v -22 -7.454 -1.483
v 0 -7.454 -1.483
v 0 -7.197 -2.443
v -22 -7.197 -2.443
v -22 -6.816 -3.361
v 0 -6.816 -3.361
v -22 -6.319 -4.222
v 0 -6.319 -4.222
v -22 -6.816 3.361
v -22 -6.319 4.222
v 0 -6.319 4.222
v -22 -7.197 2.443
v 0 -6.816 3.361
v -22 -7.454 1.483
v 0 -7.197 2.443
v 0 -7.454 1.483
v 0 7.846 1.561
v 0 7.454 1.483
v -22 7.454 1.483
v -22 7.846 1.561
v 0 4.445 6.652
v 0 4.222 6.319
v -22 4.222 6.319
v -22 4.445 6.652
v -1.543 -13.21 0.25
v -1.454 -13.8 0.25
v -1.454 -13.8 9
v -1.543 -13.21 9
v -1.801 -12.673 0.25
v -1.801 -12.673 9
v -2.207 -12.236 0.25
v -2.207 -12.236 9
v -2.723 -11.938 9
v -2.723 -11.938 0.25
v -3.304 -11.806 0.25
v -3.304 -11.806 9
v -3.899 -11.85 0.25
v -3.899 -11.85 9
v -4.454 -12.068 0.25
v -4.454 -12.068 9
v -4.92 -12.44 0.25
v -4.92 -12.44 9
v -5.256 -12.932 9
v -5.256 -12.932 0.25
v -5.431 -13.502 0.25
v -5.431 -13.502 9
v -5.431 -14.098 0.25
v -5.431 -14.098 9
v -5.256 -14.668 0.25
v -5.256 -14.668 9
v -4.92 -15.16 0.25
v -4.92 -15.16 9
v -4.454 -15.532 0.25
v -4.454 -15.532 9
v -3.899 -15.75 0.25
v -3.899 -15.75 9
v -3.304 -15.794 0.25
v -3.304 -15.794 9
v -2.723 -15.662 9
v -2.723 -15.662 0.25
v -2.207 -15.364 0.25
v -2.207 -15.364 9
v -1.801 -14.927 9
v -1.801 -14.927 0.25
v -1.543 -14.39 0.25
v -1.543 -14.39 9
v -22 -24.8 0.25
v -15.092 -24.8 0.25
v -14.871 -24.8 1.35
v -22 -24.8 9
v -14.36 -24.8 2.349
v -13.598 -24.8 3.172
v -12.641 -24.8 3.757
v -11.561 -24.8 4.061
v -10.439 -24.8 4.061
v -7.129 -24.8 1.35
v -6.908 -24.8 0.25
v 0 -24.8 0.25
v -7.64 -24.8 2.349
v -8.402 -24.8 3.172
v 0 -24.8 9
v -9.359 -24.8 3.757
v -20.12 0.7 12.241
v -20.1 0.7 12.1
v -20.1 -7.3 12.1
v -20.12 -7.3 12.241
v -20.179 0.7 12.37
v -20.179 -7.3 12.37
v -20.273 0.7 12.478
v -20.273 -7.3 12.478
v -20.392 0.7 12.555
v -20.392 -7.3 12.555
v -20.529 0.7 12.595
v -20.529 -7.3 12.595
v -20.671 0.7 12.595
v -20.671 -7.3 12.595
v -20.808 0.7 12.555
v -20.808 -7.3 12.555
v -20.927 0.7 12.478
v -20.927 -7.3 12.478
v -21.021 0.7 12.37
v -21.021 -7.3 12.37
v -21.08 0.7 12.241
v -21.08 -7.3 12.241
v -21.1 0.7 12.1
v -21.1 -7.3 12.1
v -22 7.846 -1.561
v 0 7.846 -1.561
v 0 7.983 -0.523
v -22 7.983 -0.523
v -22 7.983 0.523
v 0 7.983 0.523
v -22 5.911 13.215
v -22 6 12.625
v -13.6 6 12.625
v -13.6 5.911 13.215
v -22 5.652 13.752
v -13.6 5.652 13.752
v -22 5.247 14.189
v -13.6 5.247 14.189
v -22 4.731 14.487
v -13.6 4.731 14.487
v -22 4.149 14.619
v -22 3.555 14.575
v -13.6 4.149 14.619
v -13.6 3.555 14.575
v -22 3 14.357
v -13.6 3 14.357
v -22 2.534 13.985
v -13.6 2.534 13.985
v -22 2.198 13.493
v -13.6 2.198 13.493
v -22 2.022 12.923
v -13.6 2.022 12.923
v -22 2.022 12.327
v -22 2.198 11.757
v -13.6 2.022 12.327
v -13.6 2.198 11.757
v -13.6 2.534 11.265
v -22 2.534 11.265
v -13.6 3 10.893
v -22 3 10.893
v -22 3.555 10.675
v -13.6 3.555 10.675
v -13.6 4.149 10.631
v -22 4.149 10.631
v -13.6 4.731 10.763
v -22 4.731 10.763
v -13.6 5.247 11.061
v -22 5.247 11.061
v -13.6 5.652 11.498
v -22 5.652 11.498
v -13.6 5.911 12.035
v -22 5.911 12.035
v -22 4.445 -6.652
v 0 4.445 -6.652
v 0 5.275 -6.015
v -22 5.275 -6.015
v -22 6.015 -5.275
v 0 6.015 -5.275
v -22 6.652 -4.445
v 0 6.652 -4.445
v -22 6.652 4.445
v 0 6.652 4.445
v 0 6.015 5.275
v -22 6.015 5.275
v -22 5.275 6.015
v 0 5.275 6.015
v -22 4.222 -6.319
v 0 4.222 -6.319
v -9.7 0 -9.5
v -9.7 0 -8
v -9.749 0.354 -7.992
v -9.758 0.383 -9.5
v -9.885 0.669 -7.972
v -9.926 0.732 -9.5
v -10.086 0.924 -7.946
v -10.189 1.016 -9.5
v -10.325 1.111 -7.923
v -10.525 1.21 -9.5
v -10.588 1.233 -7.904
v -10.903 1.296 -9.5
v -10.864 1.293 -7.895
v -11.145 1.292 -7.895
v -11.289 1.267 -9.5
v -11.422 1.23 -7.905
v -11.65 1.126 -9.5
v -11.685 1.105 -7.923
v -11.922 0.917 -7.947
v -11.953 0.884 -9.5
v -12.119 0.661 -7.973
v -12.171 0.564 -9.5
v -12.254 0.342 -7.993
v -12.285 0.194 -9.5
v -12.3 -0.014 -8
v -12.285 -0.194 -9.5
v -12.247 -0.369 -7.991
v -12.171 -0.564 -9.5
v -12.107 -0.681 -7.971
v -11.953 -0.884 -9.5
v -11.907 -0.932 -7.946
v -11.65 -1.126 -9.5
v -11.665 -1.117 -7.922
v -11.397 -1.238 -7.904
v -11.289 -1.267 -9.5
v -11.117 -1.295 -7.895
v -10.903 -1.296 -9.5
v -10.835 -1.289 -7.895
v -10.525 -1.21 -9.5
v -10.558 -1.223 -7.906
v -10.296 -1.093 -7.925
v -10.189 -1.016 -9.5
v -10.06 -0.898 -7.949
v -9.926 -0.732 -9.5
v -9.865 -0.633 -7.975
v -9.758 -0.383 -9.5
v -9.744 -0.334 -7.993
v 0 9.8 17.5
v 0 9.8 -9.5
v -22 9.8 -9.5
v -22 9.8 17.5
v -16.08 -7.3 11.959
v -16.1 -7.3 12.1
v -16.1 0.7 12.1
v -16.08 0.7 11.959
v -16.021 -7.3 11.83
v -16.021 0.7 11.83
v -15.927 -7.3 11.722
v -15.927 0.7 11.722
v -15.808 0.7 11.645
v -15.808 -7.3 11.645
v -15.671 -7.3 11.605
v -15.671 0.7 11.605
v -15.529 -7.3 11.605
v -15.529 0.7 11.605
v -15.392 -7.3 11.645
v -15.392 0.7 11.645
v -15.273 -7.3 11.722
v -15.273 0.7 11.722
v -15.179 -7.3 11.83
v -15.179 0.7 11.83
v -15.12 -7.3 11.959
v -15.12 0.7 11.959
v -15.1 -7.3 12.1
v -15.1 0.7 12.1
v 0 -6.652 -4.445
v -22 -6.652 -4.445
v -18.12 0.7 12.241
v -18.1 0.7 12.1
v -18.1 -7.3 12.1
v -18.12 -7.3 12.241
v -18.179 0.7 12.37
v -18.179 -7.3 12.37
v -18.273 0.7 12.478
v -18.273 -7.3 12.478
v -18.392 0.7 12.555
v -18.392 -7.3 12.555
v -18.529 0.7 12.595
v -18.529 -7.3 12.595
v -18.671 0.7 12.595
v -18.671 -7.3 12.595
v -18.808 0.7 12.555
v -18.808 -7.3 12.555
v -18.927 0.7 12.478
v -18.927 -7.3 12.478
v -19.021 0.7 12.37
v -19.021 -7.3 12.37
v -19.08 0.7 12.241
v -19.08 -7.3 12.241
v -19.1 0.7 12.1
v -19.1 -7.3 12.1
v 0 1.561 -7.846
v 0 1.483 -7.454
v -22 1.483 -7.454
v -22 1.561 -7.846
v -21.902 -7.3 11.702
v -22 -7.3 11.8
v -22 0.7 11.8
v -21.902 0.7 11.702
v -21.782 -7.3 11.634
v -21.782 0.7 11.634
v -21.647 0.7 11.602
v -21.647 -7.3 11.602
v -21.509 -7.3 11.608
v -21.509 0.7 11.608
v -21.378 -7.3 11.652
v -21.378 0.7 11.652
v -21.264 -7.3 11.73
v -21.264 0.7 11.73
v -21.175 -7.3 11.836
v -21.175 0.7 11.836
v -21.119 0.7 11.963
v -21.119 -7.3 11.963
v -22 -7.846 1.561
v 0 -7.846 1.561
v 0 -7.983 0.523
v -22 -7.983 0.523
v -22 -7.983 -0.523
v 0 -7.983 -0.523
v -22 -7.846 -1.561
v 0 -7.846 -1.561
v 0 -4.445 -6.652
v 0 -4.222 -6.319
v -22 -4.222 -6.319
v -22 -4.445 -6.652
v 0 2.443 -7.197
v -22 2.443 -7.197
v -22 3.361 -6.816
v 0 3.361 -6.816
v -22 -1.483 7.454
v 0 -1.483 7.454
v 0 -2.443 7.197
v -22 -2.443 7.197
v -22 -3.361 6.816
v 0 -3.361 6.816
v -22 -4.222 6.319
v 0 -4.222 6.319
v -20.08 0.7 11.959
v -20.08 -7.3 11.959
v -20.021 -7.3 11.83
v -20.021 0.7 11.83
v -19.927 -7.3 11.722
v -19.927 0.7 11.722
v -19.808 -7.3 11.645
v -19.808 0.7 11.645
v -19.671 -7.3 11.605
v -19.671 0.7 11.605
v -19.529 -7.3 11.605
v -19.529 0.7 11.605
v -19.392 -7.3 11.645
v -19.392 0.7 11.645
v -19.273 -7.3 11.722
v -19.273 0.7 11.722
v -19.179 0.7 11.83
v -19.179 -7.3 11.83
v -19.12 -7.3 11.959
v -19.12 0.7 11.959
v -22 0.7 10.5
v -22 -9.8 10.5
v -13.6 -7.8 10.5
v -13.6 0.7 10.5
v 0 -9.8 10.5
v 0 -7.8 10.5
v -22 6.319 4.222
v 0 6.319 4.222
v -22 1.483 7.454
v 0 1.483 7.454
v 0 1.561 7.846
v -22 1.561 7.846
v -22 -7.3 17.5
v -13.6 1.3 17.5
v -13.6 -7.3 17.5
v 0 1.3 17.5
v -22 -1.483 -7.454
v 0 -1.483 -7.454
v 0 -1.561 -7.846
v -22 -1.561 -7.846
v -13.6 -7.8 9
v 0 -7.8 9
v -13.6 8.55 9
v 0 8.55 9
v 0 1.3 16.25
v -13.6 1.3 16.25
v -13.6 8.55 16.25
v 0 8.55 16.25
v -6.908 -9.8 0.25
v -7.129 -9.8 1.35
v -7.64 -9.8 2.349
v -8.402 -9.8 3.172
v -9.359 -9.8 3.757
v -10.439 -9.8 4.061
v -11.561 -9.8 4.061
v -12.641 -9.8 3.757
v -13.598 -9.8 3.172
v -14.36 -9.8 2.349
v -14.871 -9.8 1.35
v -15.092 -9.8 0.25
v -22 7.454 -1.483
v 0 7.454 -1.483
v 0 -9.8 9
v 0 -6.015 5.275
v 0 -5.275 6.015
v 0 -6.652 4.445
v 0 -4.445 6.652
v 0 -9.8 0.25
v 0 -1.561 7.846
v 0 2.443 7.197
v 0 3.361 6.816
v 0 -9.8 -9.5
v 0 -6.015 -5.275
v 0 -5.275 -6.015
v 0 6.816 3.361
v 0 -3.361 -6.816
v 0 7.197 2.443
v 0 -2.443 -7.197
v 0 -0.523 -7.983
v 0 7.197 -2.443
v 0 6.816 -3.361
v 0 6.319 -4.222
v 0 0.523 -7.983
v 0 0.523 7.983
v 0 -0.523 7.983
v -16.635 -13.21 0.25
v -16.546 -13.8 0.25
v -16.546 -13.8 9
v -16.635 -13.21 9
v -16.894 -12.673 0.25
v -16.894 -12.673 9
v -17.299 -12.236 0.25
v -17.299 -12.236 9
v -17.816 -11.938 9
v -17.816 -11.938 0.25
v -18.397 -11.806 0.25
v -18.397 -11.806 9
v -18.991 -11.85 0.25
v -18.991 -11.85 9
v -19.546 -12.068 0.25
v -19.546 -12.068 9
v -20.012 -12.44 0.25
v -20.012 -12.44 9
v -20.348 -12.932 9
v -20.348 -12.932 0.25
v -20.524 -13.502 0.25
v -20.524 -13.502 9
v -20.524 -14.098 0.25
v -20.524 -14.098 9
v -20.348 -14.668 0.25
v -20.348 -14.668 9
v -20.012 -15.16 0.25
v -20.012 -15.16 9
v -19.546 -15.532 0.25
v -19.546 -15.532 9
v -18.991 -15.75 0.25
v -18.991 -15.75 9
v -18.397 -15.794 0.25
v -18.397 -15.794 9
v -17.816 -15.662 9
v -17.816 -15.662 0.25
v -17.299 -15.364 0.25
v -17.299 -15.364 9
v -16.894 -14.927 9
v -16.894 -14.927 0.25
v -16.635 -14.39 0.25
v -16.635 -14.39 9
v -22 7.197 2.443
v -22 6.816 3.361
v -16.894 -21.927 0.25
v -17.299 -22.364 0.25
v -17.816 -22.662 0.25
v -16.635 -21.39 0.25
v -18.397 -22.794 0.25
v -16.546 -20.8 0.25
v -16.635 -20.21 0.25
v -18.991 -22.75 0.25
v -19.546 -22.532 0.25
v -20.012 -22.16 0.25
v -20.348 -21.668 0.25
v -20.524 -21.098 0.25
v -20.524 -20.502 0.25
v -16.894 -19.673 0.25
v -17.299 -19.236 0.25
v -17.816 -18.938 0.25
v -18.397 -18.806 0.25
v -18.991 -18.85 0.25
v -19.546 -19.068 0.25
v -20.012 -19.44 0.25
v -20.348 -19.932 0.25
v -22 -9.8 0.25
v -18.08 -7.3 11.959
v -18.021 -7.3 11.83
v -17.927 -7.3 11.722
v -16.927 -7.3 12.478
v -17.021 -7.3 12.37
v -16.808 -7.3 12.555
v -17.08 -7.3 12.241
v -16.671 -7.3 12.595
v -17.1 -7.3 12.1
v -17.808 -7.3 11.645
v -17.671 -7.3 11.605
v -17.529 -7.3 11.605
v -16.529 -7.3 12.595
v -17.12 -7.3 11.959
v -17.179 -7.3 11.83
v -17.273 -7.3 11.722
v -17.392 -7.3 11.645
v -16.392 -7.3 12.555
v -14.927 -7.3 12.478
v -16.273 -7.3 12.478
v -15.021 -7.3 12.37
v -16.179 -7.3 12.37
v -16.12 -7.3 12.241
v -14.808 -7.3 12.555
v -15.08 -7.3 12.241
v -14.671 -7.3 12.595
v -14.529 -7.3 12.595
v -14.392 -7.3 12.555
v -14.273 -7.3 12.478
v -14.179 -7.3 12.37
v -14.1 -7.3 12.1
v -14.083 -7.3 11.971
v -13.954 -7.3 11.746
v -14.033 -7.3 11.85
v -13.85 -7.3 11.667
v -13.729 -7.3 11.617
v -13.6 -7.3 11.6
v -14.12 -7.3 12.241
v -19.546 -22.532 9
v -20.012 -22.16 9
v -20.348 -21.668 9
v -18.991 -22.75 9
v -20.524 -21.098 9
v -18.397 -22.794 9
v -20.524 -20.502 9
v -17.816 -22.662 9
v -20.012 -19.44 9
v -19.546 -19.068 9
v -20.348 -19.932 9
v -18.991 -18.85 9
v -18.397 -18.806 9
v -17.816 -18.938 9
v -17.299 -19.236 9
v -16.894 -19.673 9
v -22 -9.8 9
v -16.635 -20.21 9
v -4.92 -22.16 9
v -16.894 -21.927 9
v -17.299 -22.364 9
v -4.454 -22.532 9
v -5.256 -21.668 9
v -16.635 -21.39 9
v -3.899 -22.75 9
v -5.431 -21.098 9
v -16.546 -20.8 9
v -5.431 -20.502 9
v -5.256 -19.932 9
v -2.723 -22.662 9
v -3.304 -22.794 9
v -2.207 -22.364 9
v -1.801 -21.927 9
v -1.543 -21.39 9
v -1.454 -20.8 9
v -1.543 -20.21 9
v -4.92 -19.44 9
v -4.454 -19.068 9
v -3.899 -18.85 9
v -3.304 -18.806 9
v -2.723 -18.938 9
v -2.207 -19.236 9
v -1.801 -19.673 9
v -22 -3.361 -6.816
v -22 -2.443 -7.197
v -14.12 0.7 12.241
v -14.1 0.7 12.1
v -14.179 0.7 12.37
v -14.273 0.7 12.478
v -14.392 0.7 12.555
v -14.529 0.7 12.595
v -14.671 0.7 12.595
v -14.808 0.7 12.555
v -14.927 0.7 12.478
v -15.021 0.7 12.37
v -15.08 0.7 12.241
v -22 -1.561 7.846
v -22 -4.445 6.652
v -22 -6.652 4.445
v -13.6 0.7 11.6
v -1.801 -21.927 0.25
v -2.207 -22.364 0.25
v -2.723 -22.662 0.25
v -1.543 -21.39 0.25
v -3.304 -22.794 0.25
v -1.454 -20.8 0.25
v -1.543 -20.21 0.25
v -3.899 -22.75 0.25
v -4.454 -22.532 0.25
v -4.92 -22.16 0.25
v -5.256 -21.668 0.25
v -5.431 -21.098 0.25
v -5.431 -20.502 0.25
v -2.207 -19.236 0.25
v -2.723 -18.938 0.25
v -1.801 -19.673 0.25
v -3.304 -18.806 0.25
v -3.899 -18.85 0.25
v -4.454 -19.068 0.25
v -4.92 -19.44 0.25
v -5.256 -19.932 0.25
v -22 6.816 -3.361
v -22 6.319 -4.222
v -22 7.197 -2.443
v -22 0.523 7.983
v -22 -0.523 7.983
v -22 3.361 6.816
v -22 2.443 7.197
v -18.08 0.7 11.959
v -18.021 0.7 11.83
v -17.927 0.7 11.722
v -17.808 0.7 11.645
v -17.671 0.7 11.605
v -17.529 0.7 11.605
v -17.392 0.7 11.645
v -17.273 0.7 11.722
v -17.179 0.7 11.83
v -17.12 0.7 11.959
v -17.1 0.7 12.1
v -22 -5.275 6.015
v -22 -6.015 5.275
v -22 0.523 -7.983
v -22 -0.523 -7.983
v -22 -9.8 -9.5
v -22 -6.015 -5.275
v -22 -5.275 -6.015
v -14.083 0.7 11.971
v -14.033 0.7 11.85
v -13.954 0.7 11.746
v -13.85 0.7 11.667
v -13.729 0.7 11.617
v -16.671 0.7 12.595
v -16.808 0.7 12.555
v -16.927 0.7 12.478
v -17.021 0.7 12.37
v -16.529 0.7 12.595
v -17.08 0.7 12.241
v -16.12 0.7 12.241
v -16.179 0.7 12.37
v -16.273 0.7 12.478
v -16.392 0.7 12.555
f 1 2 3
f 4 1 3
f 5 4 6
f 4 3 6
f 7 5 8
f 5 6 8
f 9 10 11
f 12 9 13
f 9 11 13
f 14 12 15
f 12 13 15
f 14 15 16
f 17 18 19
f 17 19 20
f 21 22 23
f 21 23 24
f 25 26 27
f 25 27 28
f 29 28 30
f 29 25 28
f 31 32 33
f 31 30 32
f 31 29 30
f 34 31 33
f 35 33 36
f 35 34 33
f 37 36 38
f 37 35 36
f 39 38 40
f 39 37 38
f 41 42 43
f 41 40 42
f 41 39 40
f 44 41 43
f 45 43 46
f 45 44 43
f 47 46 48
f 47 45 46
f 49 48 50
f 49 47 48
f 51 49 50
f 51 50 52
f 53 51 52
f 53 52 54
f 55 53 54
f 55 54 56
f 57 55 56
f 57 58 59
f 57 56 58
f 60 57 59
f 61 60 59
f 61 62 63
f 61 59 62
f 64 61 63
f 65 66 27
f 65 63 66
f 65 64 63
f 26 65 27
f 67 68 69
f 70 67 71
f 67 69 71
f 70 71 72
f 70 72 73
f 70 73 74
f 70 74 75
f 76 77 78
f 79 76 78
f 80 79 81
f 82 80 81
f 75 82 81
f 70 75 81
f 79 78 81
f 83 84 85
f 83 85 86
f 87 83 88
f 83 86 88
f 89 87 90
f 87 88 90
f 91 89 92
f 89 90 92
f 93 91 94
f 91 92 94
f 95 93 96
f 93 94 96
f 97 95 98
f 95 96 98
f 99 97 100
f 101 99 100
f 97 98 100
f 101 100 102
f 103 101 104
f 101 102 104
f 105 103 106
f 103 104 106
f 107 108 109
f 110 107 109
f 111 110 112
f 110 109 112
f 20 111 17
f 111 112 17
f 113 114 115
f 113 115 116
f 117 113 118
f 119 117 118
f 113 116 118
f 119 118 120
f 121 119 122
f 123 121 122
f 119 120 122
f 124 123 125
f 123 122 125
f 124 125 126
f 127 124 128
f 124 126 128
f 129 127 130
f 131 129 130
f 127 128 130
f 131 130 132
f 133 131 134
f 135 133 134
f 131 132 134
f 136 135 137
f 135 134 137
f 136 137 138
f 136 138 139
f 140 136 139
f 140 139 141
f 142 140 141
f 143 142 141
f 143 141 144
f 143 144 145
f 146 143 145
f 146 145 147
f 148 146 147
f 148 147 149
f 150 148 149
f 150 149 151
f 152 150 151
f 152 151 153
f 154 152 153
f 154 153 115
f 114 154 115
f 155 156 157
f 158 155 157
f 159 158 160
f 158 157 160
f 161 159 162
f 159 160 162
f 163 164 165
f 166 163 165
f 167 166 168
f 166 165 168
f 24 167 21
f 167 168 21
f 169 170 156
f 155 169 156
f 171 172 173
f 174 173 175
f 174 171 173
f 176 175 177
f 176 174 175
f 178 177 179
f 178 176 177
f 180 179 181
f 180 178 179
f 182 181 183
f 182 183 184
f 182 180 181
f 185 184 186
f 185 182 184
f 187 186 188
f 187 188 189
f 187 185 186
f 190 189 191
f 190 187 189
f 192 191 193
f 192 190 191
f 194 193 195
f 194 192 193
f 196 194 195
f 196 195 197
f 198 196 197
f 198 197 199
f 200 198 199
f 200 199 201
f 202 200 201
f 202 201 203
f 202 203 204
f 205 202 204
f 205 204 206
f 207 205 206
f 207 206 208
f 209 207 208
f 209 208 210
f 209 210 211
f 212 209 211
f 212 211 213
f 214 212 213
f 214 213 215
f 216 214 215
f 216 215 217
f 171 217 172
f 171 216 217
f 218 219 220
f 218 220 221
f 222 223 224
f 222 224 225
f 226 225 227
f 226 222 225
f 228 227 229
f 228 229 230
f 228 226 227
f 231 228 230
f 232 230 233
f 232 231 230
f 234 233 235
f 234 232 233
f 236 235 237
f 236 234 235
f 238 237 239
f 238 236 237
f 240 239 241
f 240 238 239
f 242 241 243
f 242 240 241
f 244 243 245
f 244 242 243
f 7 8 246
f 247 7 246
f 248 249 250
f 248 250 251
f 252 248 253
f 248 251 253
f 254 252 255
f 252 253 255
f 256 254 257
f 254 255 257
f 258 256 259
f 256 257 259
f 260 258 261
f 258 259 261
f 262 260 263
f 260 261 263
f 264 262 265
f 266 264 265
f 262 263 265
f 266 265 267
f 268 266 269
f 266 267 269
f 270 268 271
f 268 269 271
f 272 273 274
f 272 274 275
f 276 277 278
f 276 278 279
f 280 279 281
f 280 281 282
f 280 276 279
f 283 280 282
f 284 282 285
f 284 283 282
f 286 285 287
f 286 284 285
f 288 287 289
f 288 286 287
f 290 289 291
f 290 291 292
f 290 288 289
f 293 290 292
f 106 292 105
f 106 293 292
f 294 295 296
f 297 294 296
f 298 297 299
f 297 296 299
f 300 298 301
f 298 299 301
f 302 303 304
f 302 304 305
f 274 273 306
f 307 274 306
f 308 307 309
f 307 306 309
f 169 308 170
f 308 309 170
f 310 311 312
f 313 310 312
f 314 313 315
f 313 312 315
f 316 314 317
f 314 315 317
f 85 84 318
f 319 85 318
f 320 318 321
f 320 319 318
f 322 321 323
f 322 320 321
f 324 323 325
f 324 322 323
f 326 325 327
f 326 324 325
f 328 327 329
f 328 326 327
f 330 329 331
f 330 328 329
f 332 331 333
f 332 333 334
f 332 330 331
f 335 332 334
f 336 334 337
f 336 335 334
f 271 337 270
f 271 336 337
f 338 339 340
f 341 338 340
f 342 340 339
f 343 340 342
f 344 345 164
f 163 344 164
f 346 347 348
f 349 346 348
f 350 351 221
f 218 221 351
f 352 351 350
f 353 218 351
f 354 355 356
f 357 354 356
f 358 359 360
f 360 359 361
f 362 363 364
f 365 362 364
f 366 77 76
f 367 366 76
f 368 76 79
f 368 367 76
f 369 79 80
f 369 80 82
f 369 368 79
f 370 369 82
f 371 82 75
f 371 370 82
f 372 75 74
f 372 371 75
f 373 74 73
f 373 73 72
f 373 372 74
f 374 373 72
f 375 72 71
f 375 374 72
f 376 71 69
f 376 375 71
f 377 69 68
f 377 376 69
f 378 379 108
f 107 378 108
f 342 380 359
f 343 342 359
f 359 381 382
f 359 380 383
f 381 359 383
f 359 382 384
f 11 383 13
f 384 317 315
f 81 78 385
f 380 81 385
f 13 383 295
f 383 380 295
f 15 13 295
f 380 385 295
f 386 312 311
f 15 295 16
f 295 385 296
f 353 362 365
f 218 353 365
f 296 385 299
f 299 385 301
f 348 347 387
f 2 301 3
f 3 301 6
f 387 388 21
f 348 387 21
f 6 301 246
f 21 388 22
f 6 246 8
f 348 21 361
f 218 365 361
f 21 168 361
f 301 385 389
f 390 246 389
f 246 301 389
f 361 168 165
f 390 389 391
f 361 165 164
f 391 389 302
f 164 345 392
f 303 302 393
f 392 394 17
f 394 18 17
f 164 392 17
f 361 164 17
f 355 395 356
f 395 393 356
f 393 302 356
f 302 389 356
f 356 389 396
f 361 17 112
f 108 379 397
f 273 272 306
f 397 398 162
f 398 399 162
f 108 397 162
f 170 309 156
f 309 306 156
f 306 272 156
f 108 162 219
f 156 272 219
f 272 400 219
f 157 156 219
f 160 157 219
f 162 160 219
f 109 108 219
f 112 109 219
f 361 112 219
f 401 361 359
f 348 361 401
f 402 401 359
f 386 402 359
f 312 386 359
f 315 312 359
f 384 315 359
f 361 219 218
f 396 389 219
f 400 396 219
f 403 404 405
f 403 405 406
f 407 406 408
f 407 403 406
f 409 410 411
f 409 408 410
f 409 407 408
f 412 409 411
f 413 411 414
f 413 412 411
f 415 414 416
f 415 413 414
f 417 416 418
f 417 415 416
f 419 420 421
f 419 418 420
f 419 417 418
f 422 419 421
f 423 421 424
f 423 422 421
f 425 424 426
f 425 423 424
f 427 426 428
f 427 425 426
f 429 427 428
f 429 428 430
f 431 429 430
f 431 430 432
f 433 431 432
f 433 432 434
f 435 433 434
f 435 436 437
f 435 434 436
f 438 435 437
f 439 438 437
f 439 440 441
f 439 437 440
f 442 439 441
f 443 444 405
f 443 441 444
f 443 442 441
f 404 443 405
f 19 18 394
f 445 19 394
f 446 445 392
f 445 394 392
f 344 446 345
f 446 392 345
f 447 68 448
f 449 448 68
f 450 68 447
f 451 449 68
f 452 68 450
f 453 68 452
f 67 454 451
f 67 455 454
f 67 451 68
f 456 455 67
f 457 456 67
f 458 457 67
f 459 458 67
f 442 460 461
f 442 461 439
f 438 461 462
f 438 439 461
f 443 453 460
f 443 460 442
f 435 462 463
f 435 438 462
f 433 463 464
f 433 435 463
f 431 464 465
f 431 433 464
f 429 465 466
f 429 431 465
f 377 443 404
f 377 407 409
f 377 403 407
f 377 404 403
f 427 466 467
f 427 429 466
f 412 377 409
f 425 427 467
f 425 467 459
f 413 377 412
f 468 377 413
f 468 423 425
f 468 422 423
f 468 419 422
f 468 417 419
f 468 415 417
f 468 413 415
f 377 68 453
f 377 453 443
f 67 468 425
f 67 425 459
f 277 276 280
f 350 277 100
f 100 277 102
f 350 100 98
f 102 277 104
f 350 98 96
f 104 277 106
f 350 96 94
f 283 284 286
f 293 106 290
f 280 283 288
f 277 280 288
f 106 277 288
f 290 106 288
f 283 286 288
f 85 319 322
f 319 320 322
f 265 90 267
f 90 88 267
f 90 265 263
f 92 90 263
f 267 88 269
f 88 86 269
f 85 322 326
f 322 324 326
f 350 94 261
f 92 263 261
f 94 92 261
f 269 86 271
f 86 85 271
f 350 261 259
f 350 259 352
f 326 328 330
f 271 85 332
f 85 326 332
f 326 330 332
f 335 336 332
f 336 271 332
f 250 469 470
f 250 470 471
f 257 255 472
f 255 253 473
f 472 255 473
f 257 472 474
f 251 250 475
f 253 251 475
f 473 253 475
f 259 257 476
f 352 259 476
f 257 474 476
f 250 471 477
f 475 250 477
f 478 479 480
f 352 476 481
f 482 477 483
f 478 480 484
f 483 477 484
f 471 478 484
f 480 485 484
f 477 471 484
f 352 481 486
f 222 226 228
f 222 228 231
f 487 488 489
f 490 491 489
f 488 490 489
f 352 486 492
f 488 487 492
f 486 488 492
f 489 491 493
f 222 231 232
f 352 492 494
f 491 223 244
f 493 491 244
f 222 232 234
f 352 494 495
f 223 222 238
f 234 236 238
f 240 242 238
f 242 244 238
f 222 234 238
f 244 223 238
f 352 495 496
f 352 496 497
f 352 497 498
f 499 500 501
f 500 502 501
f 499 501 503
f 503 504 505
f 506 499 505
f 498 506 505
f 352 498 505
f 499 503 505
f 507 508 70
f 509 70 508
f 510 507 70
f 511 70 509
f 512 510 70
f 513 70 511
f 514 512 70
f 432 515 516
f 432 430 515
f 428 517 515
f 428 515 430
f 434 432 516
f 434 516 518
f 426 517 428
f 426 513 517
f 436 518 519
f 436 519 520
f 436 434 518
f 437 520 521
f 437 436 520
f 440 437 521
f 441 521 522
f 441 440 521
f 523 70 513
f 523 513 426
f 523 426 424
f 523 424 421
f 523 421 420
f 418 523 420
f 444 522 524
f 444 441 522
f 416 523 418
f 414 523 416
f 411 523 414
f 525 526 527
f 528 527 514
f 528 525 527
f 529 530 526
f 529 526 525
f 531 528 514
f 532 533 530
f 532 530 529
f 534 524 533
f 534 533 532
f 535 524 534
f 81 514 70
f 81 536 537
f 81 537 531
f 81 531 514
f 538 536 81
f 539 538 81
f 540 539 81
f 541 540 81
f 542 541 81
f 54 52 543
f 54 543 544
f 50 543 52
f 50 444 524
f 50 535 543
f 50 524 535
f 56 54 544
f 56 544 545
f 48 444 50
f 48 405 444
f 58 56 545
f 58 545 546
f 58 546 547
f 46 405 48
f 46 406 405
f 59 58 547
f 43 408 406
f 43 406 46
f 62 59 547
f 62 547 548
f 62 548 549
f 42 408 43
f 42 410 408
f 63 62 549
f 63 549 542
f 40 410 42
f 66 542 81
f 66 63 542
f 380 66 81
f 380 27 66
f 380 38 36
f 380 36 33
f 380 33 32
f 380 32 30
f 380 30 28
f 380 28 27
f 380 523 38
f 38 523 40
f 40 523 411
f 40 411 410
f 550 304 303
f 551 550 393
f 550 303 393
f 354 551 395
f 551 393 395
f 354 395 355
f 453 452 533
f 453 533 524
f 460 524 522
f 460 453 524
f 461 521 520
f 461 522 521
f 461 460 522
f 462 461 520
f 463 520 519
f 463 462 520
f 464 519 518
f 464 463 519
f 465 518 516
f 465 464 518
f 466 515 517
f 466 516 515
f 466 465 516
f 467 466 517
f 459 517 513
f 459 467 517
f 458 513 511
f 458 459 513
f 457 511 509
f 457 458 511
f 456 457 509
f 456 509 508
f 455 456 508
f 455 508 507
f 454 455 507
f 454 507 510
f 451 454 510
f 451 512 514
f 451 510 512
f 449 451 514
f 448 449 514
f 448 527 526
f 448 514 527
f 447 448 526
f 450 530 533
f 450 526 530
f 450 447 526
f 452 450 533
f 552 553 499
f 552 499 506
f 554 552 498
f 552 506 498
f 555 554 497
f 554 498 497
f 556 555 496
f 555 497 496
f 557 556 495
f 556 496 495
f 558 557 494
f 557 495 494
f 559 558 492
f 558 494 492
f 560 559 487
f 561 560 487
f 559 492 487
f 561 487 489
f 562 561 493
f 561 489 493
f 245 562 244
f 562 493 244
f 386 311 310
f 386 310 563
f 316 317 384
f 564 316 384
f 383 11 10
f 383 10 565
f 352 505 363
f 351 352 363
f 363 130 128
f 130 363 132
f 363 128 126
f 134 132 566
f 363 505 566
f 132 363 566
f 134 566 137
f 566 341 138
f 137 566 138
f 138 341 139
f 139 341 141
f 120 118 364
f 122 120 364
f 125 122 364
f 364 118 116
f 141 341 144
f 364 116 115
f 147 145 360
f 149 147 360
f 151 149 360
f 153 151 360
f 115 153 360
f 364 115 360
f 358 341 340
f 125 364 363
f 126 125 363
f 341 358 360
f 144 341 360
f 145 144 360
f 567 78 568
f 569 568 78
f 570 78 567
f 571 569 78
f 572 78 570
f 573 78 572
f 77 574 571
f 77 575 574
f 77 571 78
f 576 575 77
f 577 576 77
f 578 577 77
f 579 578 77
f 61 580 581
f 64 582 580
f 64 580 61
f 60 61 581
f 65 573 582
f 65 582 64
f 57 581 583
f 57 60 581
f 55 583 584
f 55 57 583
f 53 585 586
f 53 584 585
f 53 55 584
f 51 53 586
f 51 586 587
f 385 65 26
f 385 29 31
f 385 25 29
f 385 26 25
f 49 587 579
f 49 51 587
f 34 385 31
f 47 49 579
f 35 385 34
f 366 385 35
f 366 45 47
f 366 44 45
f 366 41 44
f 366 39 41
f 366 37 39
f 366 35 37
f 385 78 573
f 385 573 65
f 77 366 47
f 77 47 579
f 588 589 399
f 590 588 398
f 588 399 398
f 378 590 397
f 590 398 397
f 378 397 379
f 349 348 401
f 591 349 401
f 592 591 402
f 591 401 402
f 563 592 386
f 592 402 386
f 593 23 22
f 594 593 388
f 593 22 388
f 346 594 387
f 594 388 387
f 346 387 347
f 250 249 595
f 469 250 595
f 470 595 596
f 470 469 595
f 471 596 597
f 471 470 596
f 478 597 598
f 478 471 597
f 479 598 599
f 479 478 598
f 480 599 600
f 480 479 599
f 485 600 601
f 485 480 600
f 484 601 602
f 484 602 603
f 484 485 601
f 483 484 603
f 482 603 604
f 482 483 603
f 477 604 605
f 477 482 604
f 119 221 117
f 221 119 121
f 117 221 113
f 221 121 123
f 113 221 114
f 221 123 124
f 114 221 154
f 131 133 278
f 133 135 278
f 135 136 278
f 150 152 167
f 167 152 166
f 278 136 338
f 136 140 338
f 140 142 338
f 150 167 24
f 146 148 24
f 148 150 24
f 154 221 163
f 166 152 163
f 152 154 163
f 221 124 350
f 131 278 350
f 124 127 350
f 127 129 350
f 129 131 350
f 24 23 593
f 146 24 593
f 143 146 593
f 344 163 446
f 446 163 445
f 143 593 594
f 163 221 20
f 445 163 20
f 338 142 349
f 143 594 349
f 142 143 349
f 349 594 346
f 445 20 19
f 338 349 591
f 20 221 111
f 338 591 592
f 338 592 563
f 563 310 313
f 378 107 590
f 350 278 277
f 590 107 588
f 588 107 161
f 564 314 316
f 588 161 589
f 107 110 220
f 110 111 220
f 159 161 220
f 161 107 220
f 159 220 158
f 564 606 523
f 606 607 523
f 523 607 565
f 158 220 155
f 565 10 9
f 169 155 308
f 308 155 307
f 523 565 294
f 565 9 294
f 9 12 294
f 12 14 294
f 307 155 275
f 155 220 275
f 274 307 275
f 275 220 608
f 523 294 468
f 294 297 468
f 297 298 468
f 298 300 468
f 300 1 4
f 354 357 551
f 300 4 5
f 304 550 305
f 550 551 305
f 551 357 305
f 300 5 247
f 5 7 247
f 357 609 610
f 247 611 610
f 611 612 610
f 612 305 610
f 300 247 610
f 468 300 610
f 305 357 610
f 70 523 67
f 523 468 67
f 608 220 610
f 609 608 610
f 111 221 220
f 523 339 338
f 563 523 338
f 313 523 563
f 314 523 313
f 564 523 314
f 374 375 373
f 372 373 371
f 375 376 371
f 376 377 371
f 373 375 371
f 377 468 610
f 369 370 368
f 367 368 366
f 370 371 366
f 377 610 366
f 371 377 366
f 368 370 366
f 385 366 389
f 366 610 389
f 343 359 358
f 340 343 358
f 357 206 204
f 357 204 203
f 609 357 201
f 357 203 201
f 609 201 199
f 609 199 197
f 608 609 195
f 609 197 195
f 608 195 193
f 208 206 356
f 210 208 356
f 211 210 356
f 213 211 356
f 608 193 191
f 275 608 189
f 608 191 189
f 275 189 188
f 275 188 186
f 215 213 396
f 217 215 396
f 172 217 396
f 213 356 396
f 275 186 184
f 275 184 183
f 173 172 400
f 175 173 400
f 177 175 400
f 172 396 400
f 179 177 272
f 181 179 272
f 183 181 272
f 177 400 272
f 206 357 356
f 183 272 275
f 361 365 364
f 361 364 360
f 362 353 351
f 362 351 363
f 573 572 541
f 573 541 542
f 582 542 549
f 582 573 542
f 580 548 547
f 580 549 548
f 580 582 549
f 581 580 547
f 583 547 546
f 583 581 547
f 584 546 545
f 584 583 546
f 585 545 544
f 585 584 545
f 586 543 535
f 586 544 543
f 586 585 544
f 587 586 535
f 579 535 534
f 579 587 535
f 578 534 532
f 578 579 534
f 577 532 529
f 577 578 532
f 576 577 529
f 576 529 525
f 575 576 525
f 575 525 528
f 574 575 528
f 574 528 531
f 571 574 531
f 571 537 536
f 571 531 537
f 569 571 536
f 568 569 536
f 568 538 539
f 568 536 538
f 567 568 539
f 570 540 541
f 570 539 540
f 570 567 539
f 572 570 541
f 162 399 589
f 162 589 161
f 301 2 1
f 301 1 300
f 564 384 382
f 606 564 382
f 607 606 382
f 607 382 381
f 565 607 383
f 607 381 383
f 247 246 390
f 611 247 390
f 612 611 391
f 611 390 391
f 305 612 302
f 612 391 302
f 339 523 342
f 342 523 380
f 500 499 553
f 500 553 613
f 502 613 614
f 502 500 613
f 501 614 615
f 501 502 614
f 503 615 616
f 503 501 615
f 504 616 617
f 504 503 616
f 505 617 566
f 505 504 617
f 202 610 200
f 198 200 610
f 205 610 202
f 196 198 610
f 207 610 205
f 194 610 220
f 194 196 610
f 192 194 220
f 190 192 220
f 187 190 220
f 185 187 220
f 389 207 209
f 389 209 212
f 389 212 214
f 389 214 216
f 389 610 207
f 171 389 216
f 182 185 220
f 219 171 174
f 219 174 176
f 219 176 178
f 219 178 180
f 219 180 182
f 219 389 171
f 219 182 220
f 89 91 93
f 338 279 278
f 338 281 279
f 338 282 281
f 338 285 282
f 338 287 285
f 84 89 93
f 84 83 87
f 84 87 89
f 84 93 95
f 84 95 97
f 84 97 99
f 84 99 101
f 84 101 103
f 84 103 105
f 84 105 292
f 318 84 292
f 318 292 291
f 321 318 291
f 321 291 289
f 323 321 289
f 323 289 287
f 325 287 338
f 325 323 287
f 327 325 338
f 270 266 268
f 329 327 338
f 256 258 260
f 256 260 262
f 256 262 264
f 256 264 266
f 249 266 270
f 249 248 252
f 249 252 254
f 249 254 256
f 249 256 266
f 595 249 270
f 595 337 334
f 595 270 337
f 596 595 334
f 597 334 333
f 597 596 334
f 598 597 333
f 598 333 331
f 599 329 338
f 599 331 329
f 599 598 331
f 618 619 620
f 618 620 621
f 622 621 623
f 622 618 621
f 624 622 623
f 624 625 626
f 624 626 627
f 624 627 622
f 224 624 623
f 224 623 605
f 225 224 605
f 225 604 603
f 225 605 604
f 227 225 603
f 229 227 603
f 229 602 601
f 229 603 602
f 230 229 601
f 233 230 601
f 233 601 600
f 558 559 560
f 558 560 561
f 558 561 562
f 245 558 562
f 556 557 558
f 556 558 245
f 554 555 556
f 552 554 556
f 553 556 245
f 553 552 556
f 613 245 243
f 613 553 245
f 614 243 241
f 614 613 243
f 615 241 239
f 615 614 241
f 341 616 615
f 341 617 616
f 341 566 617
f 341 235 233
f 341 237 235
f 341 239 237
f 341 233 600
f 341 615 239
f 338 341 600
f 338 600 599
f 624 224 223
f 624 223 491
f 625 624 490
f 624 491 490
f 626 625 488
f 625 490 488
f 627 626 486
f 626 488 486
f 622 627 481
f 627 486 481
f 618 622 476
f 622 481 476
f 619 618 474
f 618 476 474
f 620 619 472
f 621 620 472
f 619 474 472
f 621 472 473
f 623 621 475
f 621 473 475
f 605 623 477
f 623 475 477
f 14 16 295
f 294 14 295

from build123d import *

# Parameters (mm, degrees)
PAD017_DEPTH       = 15
SKETCH040_R        = 2
POCKET019_DEPTH    = 9.001
SKETCH_W           = 19.6
SKETCH_H           = 18.5
SKETCH_R           = 7.6
PAD_DEPTH          = 22
SKETCH002_W        = 17.1
SKETCH002_H        = 8.4
PAD001_DEPTH       = 8.5
POCKET_DEPTH       = 8
PAD002_DEPTH       = 13.6
SKETCH005_R        = 2
POCKET001_DEPTH    = 22.001
POCKET002_DEPTH    = 101.929968
POLARPATTERN_COUNT = 8
PAD004_DEPTH       = 1.5
SKETCH041_R        = 1.3
POCKET020_DEPTH    = 5


with BuildPart() as body023:
    # Sketch039 (on DatumPlane) → Pad017 (new body)
    with BuildSketch(Plane(origin=(0, -9.8, 0), x_dir=(0, 0, -1), z_dir=(0, -1, 0))):
        with BuildLine():
            Line((-9, 0), (-0.25, 0))
            Line((-0.25, 0), (-0.25, -6.907629))
            ThreePointArc((-0.25, -6.907629), (-4.1, -11), (-0.25, -15.092371))
            Line((-0.25, -15.092371), (-0.25, -22))
            Line((-0.25, -22), (-9, -22))
            Line((-9, -22), (-9, 0))
        make_face()
    extrude(amount=PAD017_DEPTH)

    # Sketch040 → Pocket019 (cut, through all)
    with BuildSketch(Plane.XY):
        with Locations((-18.546185, -20.8)):
            Circle(SKETCH040_R)
        with Locations((-18.546185, -13.8)):
            Circle(SKETCH040_R)
        with Locations((-3.453815, -13.8)):
            Circle(SKETCH040_R)
        with Locations((-3.453815, -20.8)):
            Circle(SKETCH040_R)
    extrude(amount=POCKET019_DEPTH, mode=Mode.SUBTRACT)


with BuildPart() as printable_axisholder_x_fusion:
    # Sketch → Pad (new body)
    with BuildSketch(Plane.YZ):
        with Locations((0, -0.25)):
            Rectangle(SKETCH_W, SKETCH_H)
        Circle(SKETCH_R, mode=Mode.SUBTRACT)
    extrude(amount=-PAD_DEPTH)

    # Sketch002 → Pad001 (join)
    with BuildSketch(Plane(origin=(0, 0, 9), x_dir=(0, -1, 0), z_dir=(0, 0, 1))):
        with Locations((-1.25, -17.8)):
            Rectangle(SKETCH002_W, SKETCH002_H)
    extrude(amount=PAD001_DEPTH)

    # Sketch003 → Pocket (cut)
    with BuildSketch(Plane(origin=(0, -7.3, 0), x_dir=(0, 0, -1), z_dir=(0, -1, 0))):
        with BuildLine():
            Line((-10.5, -22), (-10.5, -13.6))
            Line((-10.5, -13.6), (-11.6, -13.6))
            ThreePointArc((-12.1, -14.1), (-11.746447, -13.953553), (-11.6, -13.6))
            ThreePointArc((-12.1, -14.1), (-12.6, -14.6), (-12.1, -15.1))
            ThreePointArc((-12.1, -16.1), (-11.6, -15.6), (-12.1, -15.1))
            ThreePointArc((-12.1, -16.1), (-12.6, -16.6), (-12.1, -17.1))
            ThreePointArc((-12.1, -18.1), (-11.6, -17.6), (-12.1, -17.1))
            ThreePointArc((-12.1, -18.1), (-12.6, -18.6), (-12.1, -19.1))
            ThreePointArc((-12.1, -20.1), (-11.6, -19.6), (-12.1, -19.1))
            ThreePointArc((-12.1, -20.1), (-12.6, -20.6), (-12.1, -21.1))
            ThreePointArc((-11.8, -22), (-11.625658, -21.441886), (-12.1, -21.1))
            Line((-11.8, -22), (-10.5, -22))
        make_face()
    extrude(amount=-POCKET_DEPTH, mode=Mode.SUBTRACT)

    # Sketch004 (on DatumPlane) → Pad002 (join)
    with BuildSketch(Plane.YZ):
        Polygon((9.8, 17.5), (1.3, 17.5), (1.3, 16.25), (8.55, 16.25), (8.55, 9), (9.8, 9), align=None)
    extrude(amount=-PAD002_DEPTH)

    # Sketch005 (on DatumPlane) → Pocket001 (cut, through all)
    with BuildSketch(Plane.YZ):
        with Locations((4, 12.625)):
            Circle(SKETCH005_R)
    extrude(amount=-POCKET001_DEPTH, mode=Mode.SUBTRACT)

    # Sketch006 (on DatumPlane) → Pocket002 (cut, through all)
    with BuildSketch(Plane.YZ):
        with BuildLine():
            ThreePointArc((-7.846282, 1.560723), (-8, 0), (-7.846282, -1.560723))
            Line((-6.708571, -1.334418), (-7.846282, -1.560723))
            ThreePointArc((-6.708571, 1.334418), (-6.84, 0), (-6.708571, -1.334418))
            Line((-6.708571, 1.334418), (-7.846282, 1.560723))
        make_face()
    pocket002 = extrude(amount=-POCKET002_DEPTH, mode=Mode.SUBTRACT)

    # PolarPattern: Pocket002 ×8 about axis
    polarpattern_axis = Axis((0, 0, 0), (1, 0, 0))
    for i in range(1, POLARPATTERN_COUNT):
        add(pocket002.rotate(polarpattern_axis, i * 360 / POLARPATTERN_COUNT), mode=Mode.SUBTRACT)

    # Sketch010 (on DatumPlane) → Pad004 (join)
    with BuildSketch(Plane.XY.offset(9)):
        Polygon((0, -7.8), (-13.6, -7.8), (-13.6, -7.3), (-22, -7.3), (-22, -9.8), (0, -9.8), align=None)
    extrude(amount=PAD004_DEPTH)

    # Sketch041 → Pocket020 (cut)
    with BuildSketch(Plane.XY.offset(-9.5)):
        with Locations((-11, 0)):
            Circle(SKETCH041_R)
    extrude(amount=POCKET020_DEPTH, mode=Mode.SUBTRACT)

    # Fusion: union Body023
    add(body023.part)


solid = printable_axisholder_x_fusion.part
